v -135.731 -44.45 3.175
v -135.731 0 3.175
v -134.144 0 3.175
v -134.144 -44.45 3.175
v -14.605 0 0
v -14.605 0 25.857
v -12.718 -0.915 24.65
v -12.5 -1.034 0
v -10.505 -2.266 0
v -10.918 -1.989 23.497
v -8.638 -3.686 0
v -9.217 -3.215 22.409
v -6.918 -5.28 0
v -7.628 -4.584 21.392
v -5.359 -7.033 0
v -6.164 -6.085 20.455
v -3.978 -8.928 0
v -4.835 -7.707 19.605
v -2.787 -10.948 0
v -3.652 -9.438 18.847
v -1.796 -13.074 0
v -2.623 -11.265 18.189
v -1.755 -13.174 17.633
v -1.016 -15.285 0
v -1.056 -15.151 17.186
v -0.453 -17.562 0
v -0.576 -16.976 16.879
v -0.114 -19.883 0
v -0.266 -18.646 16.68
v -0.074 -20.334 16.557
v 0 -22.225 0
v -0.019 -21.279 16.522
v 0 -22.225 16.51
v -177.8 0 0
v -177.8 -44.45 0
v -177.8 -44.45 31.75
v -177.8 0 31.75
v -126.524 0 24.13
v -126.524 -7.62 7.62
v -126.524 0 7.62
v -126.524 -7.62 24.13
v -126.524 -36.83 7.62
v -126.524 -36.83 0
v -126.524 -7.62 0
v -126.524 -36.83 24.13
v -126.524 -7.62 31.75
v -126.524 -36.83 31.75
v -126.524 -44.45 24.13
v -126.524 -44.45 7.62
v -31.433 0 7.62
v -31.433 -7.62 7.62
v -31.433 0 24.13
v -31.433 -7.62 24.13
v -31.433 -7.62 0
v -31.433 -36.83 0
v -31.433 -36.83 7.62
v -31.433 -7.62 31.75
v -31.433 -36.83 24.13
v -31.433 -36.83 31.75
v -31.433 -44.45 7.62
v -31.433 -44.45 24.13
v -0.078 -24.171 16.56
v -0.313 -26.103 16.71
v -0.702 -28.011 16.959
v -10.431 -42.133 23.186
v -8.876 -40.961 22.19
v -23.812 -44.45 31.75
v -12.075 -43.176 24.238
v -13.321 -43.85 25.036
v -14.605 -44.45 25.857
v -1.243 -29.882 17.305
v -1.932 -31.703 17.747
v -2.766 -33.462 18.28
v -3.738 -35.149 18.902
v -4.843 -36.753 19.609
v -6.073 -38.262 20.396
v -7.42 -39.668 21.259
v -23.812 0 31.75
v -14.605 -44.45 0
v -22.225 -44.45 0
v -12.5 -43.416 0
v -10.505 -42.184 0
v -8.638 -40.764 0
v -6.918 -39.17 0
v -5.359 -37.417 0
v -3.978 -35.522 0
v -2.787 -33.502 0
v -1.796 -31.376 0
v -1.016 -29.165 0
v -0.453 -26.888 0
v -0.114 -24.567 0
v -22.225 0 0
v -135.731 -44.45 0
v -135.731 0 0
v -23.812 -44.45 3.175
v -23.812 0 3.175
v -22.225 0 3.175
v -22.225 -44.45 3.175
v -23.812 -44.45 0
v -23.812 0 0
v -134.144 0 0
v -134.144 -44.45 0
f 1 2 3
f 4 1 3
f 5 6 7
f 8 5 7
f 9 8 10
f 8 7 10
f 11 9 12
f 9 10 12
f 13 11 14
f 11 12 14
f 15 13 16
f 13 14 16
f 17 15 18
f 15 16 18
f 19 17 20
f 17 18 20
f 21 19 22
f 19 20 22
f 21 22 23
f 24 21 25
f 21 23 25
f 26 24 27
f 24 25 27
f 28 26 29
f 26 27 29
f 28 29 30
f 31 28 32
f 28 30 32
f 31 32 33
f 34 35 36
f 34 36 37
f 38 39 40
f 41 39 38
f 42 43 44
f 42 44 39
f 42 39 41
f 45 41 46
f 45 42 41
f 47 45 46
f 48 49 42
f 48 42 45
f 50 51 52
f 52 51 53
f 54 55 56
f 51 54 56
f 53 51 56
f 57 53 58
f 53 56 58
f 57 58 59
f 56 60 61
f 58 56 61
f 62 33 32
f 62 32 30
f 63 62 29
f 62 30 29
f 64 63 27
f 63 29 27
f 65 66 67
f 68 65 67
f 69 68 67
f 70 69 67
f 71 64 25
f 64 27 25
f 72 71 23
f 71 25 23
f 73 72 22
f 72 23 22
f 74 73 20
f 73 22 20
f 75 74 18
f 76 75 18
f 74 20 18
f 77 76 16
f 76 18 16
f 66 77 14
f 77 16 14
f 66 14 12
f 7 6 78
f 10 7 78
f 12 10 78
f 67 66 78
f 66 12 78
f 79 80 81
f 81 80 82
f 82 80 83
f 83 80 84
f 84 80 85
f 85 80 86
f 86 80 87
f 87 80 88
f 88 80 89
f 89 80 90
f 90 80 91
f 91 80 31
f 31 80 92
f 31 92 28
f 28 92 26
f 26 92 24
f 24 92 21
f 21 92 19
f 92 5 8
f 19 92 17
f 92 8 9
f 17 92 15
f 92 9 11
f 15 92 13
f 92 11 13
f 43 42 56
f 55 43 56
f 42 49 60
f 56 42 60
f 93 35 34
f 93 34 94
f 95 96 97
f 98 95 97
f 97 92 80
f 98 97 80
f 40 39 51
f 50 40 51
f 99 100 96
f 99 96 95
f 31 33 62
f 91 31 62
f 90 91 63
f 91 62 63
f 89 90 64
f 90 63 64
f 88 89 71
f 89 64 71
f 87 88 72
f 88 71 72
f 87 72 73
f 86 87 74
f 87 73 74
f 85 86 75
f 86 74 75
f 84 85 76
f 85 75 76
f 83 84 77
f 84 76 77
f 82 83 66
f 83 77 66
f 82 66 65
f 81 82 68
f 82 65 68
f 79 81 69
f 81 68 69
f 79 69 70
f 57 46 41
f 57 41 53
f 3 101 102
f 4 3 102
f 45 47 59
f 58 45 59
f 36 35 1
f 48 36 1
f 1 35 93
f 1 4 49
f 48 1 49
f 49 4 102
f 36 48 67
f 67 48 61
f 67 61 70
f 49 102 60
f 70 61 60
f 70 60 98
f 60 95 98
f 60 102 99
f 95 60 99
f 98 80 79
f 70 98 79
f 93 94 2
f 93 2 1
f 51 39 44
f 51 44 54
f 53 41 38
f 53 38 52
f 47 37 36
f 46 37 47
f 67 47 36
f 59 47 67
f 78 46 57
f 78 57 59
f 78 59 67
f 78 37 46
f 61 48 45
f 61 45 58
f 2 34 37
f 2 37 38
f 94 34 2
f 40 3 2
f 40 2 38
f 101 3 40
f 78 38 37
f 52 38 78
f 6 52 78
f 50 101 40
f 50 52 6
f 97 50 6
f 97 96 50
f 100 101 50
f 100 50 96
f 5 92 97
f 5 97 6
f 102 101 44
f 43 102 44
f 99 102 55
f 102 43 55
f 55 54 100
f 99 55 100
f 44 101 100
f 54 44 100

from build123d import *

# Parameters (mm, degrees)
F0_W      = 177.8
F0_H      = 44.45
F1_DEPTH  = 31.75
F2_W      = 1.5875
F2_H      = 44.45
F3_DEPTH  = 3.175
F4_W      = 95.09125
F4_H      = 29.21
F5_DEPTH  = 31.751
F6_W      = 95.09125
F6_H      = 16.51
F7_DEPTH  = 44.451
F9_DEPTH  = 31.751
F11_DEPTH = 44.451


with BuildPart() as f1:
    # F0 (on Top) → F1 (new body)
    with BuildSketch(Plane.XY):
        with Locations((-88.9, -22.225)):
            Rectangle(F0_W, F0_H)
    extrude(amount=F1_DEPTH)

    # F2 (on face) → F3 (cut)
    with BuildSketch(Plane(origin=(0, 0, 0), x_dir=(1, 0, 0), z_dir=(0, 0, -1))):
        with Locations((-23.01875, 22.225)):
            Rectangle(F2_W, F2_H)
        with Locations((-134.9375, 22.225)):
            Rectangle(F2_W, F2_H)
    extrude(amount=-F3_DEPTH, mode=Mode.SUBTRACT)

    # F4 (on face) → F5 (cut, through all)
    with BuildSketch(Plane.XY.offset(31.75)):
        with Locations((-78.978125, -22.225)):
            Rectangle(F4_W, F4_H)
    extrude(amount=-F5_DEPTH, mode=Mode.SUBTRACT)

    # F6 (on face) → F7 (cut, through all)
    with BuildSketch(Plane.XZ.offset(44.45)):
        with Locations((-78.978125, 15.875)):
            Rectangle(F6_W, F6_H)
    extrude(amount=-F7_DEPTH, mode=Mode.SUBTRACT)

    # F8 (on face) → F9 (cut, through all)
    with BuildSketch(Plane.XY.offset(31.75)):
        with BuildLine():
            ThreePointArc((-14.605, 0), (-3.978035, -8.927851), (0, -22.225))
            Line((0, -22.225), (0, 0))
            Line((0, 0), (-14.605, 0))
        make_face()
        with BuildLine():
            ThreePointArc((0, -22.225), (-3.978035, -35.522149), (-14.605, -44.45))
            Line((-14.605, -44.45), (0, -44.45))
            Line((0, -44.45), (0, -22.225))
        make_face()
    extrude(amount=-F9_DEPTH, mode=Mode.SUBTRACT)

    # F10 (on face) → F11 (cut, through all)
    with BuildSketch(Plane(origin=(0, 0, 0), x_dir=(-1, 0, 0), z_dir=(0, 1, 0))):
        Polygon((0, 16.51), (23.8125, 31.75), (0, 31.75), align=None)
    extrude(amount=-F11_DEPTH, mode=Mode.SUBTRACT)


solid = f1.part
